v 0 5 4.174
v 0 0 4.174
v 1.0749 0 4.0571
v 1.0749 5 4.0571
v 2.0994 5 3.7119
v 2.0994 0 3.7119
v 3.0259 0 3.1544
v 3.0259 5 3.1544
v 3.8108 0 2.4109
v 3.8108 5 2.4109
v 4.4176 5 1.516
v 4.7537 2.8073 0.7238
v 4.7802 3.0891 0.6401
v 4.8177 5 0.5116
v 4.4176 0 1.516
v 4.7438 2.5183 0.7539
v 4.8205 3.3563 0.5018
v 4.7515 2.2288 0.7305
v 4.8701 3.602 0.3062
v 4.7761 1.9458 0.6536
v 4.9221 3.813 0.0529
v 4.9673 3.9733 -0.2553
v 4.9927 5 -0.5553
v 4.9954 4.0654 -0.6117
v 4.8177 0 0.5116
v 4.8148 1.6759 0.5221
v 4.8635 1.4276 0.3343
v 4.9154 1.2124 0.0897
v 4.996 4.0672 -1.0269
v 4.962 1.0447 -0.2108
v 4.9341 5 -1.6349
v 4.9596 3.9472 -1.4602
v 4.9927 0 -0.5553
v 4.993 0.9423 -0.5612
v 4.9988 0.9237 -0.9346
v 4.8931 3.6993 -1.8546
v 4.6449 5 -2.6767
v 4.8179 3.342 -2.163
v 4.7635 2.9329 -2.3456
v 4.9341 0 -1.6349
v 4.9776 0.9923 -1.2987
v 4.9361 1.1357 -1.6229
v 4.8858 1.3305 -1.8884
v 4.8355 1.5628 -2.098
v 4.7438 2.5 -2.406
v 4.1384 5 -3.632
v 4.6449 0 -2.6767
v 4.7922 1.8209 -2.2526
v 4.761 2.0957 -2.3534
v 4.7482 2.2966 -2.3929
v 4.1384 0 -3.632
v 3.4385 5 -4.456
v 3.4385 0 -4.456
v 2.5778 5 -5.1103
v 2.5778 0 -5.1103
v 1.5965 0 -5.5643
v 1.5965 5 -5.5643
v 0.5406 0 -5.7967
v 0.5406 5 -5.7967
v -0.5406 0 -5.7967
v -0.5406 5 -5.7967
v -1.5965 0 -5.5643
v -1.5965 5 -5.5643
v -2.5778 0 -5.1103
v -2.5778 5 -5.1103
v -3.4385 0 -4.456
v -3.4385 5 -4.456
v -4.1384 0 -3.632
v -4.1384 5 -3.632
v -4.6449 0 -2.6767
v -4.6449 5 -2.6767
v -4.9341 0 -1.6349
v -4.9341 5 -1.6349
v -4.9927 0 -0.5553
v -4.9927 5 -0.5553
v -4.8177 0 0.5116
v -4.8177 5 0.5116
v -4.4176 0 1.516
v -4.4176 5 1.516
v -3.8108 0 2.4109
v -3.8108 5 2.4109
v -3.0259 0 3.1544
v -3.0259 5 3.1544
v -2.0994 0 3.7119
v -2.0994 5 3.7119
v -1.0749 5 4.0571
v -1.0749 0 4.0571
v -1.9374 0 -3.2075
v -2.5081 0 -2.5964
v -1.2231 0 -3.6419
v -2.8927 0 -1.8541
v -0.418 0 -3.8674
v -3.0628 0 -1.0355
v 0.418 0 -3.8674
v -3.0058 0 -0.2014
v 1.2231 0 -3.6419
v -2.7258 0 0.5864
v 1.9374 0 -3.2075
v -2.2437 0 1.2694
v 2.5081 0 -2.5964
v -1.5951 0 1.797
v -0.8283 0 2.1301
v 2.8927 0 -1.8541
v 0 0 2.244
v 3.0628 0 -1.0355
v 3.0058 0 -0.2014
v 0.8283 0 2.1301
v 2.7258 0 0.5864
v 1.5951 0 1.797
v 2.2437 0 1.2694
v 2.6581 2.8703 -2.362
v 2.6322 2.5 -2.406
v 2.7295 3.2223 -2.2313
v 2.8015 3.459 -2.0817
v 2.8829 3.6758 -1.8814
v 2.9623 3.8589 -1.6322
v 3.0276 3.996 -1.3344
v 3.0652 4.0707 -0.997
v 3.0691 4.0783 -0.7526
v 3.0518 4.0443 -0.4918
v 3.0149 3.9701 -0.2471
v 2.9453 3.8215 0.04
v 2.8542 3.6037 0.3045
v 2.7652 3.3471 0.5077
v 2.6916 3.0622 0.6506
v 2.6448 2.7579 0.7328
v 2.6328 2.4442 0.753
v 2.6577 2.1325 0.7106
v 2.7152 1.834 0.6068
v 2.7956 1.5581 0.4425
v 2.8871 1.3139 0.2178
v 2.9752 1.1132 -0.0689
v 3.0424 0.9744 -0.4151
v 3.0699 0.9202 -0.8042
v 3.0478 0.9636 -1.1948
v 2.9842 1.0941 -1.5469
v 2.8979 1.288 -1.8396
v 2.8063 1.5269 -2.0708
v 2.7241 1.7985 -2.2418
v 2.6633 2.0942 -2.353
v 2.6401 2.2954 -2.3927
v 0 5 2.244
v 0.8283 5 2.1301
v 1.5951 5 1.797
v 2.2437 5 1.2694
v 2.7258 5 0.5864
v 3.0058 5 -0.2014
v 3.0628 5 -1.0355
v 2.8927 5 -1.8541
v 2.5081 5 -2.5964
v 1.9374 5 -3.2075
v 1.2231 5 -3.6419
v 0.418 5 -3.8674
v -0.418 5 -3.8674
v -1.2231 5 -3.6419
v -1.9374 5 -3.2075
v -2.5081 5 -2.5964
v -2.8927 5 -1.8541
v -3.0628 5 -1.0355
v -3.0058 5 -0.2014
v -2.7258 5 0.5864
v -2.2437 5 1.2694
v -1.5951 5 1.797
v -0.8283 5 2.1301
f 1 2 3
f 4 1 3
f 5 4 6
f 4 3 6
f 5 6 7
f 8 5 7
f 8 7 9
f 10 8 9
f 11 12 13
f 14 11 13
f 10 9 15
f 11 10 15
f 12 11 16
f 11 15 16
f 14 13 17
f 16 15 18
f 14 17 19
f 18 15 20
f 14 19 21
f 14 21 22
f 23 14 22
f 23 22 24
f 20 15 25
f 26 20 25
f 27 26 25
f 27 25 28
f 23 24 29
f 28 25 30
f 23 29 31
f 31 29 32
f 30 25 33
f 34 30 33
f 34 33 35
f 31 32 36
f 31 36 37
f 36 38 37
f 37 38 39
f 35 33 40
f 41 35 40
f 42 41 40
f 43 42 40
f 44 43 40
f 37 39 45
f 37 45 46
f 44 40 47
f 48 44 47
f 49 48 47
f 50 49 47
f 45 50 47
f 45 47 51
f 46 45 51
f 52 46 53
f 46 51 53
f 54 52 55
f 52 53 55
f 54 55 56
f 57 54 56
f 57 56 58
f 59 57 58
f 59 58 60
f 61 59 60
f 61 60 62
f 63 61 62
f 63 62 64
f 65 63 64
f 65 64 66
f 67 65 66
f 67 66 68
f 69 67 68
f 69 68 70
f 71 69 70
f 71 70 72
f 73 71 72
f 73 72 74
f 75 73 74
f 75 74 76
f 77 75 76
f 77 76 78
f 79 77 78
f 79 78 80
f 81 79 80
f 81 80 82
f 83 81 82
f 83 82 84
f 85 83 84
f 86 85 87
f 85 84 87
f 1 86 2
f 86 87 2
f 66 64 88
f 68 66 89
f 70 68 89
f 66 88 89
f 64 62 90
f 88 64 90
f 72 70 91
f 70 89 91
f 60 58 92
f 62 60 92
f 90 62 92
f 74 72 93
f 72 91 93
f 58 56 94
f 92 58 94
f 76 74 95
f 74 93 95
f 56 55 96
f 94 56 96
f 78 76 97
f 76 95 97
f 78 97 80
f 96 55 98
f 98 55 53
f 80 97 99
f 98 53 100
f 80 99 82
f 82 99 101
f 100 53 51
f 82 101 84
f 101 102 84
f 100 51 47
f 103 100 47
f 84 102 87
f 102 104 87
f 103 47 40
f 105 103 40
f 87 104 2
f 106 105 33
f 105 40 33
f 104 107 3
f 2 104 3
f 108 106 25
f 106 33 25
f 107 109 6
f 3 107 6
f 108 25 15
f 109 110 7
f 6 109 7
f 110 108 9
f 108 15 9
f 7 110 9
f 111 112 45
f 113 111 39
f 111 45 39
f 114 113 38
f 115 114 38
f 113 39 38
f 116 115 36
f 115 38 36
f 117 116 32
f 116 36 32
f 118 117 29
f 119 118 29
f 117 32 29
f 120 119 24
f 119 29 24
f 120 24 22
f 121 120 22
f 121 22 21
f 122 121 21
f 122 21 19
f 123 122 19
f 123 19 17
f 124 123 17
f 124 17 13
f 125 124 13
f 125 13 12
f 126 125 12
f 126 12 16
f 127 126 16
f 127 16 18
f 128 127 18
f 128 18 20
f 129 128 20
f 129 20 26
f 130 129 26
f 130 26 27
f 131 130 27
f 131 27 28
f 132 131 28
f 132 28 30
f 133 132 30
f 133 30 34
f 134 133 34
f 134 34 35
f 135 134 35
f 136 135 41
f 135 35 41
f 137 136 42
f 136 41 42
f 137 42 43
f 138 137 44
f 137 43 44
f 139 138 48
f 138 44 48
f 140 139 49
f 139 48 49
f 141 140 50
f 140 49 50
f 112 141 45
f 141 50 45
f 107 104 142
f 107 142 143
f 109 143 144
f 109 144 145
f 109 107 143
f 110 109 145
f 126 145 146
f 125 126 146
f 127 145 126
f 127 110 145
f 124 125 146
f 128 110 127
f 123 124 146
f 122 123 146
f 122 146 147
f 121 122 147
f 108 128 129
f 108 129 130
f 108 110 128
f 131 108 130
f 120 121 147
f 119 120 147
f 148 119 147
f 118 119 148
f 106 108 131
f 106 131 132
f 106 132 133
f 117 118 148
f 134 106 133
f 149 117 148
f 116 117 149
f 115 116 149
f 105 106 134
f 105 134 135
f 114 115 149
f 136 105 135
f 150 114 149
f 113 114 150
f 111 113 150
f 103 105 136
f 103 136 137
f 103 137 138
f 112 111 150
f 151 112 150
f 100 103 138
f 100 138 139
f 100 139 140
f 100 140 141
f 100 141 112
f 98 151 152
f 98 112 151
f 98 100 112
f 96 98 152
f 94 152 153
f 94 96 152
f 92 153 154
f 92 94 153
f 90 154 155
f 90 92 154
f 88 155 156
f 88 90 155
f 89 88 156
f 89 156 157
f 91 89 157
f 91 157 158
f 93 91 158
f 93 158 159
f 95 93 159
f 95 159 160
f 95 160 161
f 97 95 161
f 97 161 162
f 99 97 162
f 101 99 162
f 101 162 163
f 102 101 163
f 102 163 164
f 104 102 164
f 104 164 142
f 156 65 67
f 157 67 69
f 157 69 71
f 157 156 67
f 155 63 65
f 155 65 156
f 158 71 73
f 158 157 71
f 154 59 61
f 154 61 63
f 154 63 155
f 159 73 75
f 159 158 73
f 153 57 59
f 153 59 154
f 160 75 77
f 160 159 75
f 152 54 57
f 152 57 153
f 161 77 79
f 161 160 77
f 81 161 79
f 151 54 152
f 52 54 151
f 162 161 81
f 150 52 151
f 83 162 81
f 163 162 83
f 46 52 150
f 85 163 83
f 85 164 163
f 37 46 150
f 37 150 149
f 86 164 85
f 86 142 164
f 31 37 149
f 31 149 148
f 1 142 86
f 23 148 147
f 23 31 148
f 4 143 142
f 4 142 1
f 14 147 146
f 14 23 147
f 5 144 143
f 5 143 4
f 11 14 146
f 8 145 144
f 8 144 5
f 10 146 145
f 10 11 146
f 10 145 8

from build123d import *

# Parameters (mm, degrees)
SKETCH_1_R      = 5
SKETCH_1_R_2    = 3.07
EXTRUDE_1_DEPTH = 5
SKETCH_2_W      = 11.338543919
SKETCH_2_H      = 3.370146556
EXTRUDE_2_DEPTH = 7
SKETCH_3_R      = 1.58
EXTRUDE_3_DEPTH = 6


with BuildPart() as part:
    # 草图1 → 凸台-拉伸1 (new body)
    with BuildSketch(Plane(origin=(0, 0, 0), x_dir=(1, 0, 0), z_dir=(0, 1, 0))):
        with Locations((0, 0.826021493)):
            Circle(SKETCH_1_R)
        with Locations((0, 0.826021493)):
            Circle(SKETCH_1_R_2, mode=Mode.SUBTRACT)
    extrude(amount=EXTRUDE_1_DEPTH)


with BuildPart() as body_2:
    # 草图2 → 凸台-拉伸2 (new body)
    with BuildSketch(Plane(origin=(0, 5, 0), x_dir=(1, 0, 0), z_dir=(0, 1, 0))):
        with Locations((-0.160637922, 0.629667615)):
            Rectangle(SKETCH_2_W, SKETCH_2_H)
    extrude(amount=-EXTRUDE_2_DEPTH)


with BuildPart() as body_3:
    # 草图3 → 凸台-拉伸3 (new body)
    with BuildSketch(Plane(origin=(5.508634037, 0, 0), x_dir=(0, 0, -1), z_dir=(1, 0, 0))):
        with Locations((0.826021493, 2.5)):
            Circle(SKETCH_3_R)
    extrude(amount=-EXTRUDE_3_DEPTH)


with BuildPart() as part_1:
    add(part.part)

    # Combine 1: cut body 3
    add(body_3.part, mode=Mode.SUBTRACT)


solid = part_1.part
